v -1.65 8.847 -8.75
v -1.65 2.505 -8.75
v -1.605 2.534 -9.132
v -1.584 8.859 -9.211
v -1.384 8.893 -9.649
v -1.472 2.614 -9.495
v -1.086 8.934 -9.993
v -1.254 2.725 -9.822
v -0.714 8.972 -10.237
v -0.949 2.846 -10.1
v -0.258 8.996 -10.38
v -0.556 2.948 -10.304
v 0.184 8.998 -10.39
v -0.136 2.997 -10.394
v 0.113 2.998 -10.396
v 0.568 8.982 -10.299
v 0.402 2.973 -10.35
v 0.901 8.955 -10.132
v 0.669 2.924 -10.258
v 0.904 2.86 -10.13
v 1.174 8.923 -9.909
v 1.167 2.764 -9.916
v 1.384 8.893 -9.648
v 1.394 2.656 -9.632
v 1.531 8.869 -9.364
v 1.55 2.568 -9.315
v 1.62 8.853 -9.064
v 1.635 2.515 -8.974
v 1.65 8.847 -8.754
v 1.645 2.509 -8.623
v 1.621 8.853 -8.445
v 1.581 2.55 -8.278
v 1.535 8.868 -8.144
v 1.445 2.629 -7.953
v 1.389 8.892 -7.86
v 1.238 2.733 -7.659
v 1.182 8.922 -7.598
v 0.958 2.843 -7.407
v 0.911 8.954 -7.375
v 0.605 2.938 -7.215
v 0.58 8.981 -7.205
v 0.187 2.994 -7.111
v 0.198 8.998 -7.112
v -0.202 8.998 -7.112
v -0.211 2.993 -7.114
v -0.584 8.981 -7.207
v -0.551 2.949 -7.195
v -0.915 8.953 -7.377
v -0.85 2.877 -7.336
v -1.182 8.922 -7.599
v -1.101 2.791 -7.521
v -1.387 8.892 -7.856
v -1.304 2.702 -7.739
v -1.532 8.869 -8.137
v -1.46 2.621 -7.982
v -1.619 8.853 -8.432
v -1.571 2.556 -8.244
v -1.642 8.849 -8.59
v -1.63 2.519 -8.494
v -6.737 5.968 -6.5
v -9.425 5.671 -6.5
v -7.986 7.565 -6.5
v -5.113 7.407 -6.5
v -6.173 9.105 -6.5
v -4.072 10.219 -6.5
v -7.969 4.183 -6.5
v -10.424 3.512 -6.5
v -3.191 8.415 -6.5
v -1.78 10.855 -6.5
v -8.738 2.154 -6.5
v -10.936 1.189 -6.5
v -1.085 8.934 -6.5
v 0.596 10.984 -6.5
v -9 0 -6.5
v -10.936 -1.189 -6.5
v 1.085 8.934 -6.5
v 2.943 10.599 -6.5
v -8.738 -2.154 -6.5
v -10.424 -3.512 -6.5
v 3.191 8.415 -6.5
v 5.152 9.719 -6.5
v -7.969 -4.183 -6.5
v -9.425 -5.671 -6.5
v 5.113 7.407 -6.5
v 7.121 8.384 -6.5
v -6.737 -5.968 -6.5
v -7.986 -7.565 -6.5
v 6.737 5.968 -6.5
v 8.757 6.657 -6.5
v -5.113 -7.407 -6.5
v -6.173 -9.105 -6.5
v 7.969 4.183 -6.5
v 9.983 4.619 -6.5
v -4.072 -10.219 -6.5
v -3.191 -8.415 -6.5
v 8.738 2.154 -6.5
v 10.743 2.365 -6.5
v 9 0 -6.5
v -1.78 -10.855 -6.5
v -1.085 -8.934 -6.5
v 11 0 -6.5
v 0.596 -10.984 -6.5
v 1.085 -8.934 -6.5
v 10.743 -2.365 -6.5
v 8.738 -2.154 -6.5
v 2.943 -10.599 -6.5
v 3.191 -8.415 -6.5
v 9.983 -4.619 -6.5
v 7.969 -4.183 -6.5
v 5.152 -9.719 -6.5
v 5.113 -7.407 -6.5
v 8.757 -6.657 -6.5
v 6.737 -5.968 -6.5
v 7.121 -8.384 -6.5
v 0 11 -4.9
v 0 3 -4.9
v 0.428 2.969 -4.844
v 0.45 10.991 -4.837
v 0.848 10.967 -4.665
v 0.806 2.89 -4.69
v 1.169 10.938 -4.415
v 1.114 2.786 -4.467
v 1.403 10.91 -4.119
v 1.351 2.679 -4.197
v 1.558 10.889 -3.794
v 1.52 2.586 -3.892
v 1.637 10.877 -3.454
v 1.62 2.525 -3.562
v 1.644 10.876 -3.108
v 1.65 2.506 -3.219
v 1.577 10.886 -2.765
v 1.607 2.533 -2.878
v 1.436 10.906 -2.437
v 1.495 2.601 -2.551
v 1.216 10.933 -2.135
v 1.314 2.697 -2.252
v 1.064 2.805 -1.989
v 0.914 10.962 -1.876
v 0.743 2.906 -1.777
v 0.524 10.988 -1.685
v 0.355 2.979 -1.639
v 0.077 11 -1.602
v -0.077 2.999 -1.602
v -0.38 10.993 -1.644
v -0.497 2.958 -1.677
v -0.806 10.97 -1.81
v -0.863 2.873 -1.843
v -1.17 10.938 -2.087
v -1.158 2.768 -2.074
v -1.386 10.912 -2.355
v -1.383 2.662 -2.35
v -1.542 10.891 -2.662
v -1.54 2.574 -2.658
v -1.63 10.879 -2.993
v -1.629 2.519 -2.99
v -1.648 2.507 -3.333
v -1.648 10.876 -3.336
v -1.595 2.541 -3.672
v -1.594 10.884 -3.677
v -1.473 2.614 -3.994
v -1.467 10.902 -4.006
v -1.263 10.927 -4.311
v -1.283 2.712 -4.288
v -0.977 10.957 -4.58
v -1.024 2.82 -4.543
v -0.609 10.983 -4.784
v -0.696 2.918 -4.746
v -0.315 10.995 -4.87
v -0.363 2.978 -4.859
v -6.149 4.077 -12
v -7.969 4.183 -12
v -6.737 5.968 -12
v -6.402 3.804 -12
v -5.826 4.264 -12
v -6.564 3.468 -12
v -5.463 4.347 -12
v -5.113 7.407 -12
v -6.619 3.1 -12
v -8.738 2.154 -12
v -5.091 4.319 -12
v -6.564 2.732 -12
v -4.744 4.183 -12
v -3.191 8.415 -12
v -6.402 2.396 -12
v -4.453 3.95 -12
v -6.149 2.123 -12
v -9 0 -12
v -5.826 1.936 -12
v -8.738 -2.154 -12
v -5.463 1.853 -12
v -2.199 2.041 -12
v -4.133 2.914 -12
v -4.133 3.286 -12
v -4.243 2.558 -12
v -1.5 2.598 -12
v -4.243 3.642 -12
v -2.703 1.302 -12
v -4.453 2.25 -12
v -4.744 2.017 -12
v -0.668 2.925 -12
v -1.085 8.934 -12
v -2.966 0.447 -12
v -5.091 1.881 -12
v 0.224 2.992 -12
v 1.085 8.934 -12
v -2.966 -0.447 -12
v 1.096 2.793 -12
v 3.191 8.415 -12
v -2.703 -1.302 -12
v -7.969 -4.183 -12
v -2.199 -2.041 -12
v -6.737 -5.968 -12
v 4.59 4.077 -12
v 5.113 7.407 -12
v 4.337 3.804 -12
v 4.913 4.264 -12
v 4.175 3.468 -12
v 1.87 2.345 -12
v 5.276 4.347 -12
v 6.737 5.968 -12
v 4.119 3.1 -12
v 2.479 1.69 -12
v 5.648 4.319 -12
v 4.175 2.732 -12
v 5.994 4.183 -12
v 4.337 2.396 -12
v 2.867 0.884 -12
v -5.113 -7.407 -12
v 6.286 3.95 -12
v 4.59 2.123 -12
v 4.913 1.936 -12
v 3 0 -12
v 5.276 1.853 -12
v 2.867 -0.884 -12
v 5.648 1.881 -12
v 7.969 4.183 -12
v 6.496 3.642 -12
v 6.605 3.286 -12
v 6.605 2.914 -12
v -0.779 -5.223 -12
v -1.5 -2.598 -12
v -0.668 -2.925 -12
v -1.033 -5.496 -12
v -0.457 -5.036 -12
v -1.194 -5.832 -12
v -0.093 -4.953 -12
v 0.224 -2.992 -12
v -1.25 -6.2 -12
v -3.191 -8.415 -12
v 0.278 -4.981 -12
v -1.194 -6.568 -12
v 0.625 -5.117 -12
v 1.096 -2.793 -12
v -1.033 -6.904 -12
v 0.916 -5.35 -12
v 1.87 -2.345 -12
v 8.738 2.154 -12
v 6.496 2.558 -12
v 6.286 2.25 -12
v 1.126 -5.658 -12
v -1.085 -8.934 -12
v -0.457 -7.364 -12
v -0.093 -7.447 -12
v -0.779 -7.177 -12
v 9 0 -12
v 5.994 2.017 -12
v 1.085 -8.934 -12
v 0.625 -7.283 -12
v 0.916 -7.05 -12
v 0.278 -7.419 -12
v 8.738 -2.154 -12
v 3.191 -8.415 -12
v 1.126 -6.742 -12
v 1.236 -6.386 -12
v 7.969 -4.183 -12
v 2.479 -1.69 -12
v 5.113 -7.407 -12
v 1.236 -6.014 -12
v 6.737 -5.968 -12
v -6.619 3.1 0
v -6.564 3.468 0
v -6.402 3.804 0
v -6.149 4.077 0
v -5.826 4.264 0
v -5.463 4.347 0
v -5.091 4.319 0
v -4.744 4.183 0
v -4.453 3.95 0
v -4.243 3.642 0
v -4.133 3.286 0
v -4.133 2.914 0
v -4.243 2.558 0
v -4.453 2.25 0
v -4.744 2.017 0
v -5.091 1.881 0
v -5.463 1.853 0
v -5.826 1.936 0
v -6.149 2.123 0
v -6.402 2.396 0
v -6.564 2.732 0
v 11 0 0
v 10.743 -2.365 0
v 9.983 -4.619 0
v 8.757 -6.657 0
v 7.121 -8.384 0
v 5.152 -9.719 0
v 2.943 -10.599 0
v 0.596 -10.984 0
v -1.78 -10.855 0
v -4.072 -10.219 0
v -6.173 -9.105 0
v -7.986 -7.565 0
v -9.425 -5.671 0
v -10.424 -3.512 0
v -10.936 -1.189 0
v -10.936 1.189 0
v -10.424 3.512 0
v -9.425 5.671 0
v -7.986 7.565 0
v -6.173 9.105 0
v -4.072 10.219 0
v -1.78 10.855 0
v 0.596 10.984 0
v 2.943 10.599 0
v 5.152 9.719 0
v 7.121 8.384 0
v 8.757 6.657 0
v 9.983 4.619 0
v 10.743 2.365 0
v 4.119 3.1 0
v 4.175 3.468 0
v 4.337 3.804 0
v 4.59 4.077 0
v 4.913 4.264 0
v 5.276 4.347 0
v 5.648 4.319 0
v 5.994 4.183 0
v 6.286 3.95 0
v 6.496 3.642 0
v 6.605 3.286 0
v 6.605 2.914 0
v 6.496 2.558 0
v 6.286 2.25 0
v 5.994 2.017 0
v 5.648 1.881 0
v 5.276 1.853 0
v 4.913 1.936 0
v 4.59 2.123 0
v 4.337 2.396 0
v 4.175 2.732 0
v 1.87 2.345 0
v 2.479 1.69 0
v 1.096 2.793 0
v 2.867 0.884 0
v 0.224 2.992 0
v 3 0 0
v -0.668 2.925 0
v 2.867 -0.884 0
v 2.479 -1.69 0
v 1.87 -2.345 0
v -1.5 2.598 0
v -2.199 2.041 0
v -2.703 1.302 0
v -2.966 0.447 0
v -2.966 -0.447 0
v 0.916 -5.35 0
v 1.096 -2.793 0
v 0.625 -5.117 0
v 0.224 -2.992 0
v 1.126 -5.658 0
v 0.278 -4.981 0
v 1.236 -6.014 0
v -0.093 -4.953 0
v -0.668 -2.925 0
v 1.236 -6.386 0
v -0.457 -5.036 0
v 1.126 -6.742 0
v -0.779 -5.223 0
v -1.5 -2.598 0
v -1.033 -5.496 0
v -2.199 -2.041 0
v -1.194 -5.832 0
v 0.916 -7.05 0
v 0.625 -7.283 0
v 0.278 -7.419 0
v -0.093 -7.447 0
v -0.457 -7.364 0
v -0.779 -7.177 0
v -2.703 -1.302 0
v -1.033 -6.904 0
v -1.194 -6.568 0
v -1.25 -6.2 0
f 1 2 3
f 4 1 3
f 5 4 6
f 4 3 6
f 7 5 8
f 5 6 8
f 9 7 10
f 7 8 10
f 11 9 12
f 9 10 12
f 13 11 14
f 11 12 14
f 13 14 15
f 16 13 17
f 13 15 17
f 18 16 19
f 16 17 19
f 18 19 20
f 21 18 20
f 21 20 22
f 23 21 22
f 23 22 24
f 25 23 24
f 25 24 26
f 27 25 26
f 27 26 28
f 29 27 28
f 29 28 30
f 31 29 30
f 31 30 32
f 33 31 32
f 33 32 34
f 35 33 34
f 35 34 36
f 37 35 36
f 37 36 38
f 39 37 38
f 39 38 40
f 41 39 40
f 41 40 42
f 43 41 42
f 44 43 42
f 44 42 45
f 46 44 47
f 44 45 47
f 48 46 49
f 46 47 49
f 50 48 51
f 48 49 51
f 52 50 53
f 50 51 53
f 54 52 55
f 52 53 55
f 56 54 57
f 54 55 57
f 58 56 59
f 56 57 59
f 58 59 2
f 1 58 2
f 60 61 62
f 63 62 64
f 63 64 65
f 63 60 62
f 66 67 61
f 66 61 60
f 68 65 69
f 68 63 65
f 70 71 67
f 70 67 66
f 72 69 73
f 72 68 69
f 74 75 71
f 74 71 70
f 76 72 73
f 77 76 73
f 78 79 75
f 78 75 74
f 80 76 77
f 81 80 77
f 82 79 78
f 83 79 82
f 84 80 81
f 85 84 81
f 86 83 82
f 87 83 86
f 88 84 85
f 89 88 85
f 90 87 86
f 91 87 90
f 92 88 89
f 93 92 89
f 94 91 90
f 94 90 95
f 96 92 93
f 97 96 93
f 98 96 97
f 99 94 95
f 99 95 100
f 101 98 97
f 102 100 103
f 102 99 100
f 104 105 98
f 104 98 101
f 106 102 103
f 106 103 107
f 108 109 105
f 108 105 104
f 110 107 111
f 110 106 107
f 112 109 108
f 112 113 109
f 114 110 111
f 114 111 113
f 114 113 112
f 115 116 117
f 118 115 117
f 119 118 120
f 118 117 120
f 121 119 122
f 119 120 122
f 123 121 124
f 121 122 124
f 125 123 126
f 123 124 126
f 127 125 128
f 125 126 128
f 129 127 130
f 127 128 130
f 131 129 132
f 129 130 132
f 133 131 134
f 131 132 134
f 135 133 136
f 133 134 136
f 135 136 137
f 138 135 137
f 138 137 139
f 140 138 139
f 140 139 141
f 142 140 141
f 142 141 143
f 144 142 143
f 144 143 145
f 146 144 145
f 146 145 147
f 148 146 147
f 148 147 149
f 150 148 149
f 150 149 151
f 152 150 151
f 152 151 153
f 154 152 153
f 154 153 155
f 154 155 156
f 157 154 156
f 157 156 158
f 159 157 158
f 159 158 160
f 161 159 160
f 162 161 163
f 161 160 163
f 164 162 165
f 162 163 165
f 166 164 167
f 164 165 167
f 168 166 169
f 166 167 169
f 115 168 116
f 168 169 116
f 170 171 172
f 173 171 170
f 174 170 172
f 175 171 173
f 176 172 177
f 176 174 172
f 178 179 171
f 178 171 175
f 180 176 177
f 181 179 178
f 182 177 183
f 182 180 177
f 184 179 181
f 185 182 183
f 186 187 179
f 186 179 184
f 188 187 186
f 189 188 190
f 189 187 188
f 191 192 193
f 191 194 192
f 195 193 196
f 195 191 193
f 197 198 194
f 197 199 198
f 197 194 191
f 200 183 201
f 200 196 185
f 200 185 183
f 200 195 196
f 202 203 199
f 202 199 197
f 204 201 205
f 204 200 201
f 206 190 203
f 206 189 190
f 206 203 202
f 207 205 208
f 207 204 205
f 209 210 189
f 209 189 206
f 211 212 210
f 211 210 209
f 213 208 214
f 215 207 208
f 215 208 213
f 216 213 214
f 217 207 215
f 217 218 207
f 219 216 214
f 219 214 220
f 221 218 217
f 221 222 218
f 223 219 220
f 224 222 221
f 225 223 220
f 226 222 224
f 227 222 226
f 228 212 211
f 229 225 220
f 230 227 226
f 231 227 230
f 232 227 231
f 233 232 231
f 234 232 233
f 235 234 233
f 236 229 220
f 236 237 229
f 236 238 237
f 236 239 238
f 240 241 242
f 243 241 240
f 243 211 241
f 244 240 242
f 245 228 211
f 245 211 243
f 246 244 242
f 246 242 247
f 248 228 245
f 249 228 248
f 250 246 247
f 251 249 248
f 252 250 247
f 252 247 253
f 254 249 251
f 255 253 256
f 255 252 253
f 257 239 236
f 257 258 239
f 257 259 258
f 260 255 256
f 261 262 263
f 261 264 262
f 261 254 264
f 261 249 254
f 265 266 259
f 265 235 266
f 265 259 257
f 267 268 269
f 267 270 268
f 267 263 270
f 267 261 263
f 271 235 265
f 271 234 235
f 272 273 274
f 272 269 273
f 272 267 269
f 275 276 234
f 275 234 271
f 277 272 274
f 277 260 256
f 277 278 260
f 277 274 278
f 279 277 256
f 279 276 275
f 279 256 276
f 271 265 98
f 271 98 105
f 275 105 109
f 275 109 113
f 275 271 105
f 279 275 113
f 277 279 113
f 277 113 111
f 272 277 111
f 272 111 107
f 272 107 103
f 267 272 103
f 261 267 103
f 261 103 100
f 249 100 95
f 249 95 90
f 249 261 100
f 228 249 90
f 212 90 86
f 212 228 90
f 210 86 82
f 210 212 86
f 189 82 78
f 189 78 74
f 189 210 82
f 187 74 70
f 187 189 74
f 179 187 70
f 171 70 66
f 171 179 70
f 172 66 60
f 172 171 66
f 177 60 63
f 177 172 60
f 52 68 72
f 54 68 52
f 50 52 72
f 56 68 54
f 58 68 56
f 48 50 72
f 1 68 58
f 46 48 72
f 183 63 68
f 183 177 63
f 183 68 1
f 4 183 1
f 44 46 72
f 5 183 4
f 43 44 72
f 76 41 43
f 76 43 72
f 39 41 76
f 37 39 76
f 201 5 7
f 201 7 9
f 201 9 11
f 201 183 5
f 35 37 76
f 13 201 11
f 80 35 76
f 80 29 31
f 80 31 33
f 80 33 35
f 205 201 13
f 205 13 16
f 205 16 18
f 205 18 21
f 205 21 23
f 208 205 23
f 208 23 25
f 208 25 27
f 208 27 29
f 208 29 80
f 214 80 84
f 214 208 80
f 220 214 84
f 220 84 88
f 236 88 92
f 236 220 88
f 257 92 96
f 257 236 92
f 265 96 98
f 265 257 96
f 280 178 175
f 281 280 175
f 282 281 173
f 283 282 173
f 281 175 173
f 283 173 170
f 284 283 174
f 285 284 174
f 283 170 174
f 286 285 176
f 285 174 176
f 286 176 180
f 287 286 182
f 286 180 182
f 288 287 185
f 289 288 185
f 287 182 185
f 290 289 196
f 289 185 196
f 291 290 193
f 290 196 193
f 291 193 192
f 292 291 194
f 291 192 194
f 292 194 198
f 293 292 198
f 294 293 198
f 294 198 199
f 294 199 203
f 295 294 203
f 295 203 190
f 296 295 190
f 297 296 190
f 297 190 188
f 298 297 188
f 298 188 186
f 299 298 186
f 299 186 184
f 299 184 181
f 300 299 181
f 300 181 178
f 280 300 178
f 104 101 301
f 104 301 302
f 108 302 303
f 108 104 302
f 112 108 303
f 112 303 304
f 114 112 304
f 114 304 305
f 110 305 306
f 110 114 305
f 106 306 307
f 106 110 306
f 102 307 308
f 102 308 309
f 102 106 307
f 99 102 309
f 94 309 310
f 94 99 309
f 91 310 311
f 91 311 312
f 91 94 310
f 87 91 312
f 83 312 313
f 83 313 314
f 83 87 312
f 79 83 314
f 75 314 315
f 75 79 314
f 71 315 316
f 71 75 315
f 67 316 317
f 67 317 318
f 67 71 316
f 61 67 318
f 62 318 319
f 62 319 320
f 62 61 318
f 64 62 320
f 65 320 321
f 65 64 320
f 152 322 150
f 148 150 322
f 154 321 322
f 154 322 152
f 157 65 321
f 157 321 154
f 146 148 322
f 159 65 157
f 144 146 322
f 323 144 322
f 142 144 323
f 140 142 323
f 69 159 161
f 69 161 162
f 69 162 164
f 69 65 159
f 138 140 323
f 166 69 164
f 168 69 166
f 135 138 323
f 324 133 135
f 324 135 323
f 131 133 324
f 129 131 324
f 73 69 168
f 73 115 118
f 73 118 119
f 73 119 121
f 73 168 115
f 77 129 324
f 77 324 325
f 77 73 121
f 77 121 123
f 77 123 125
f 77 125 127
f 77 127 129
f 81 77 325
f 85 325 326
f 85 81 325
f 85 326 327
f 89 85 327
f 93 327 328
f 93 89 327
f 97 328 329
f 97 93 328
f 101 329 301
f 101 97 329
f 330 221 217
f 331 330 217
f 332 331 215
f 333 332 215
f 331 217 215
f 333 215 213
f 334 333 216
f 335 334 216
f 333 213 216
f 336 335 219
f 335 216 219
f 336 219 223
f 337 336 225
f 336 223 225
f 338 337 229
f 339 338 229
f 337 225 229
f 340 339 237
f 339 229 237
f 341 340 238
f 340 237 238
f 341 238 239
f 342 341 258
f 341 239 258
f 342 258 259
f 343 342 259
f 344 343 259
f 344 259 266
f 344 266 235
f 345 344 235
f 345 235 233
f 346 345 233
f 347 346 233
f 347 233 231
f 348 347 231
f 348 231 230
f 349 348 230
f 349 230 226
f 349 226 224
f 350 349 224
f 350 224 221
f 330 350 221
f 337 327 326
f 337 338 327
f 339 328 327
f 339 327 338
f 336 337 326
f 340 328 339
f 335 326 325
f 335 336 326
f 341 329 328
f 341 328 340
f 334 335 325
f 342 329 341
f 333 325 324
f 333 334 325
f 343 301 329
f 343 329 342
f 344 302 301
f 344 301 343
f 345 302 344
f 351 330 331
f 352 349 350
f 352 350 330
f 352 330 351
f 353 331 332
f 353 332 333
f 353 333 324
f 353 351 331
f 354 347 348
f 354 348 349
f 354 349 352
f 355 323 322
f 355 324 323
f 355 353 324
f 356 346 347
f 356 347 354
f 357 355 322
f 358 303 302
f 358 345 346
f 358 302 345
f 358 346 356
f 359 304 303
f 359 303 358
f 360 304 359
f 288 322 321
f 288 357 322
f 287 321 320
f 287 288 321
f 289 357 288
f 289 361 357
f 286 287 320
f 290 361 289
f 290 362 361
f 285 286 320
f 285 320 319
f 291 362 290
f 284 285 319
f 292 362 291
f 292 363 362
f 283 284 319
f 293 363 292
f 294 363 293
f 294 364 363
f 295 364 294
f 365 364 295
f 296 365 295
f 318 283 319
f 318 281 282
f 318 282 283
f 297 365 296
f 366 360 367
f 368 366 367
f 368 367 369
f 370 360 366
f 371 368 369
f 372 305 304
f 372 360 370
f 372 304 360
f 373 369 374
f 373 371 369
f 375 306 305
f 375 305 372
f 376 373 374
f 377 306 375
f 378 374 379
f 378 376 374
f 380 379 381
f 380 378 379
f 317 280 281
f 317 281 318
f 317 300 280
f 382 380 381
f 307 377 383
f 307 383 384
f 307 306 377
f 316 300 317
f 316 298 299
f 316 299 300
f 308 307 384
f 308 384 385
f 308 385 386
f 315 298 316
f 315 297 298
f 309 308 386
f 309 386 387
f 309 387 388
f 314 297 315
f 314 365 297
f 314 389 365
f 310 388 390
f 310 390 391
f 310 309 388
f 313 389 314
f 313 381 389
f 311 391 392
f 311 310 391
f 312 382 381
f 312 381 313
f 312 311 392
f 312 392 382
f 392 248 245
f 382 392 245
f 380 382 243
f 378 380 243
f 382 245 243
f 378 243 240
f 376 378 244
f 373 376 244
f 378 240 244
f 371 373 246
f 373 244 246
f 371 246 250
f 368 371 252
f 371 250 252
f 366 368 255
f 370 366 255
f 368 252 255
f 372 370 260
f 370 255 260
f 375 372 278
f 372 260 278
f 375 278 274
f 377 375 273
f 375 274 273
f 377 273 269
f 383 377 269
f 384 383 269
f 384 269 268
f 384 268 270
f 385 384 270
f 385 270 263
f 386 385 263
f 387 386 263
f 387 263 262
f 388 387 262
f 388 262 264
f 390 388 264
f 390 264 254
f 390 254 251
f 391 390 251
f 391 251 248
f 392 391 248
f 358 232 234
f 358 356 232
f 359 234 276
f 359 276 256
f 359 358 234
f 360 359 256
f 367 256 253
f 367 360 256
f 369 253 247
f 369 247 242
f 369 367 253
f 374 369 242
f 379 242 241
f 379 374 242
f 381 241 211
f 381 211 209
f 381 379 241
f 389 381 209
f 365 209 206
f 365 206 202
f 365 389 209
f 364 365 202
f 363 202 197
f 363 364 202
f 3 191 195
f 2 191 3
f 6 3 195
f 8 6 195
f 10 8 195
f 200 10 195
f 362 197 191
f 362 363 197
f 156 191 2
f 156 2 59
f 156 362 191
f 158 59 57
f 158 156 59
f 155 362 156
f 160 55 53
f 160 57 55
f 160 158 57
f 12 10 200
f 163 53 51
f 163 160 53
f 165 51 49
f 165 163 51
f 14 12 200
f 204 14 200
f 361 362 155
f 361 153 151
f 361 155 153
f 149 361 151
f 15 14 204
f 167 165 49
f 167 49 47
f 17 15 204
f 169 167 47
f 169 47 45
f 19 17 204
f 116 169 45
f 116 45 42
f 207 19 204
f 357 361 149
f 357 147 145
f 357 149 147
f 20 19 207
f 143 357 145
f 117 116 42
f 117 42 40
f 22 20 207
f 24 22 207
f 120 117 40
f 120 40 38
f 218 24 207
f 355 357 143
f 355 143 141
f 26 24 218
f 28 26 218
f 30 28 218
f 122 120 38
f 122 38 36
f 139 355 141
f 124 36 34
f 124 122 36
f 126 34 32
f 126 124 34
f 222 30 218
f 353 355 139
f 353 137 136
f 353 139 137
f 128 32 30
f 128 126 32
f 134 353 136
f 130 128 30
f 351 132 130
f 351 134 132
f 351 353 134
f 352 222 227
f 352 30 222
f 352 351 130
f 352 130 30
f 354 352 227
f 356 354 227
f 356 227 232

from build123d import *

# Parameters (mm, degrees)
M3X0_5_TAPPED_HOLE1_D               = 2.5
M4X0_7_TAPPED_HOLE1_D               = 3.3
M4X0_7_TAPPED_HOLE1_DEPTH           = 10.999
M4X0_7_TAPPED_HOLE1_TIP             = 0.991420021
M4X0_7_TAPPED_HOLE1_ON_FACE_2_D     = 3.3
M4X0_7_TAPPED_HOLE1_ON_FACE_2_DEPTH = 10.999
M4X0_7_TAPPED_HOLE1_ON_FACE_2_TIP   = 0.991420021


with BuildPart() as part:
    # Sketch2 → Revolve1 (revolve)
    with BuildSketch(Plane(origin=(0, 0, 0), x_dir=(0, 0, -1), z_dir=(1, 0, 0)), mode=Mode.PRIVATE) as revolve1_sk:
        Polygon((0, 3), (0, 11), (6.5, 11), (6.5, 9), (12, 9), (12, 3), align=None)
    revolve(revolve1_sk.sketch.rotate(Axis((0, 0, 0), (0, 0, -1)), 90), axis=Axis((0, 0, 0), (0, 0, -1)))

    # M3x0.5 Tapped Hole1 (through all)
    with Locations(Plane.XY):
        with Locations((35.910466859, 13.470944302), (5.369357503, 3.1), (-5.369357503, 3.1), (0, -6.2)):
            Hole(M3X0_5_TAPPED_HOLE1_D / 2)

    # M4x0.7 Tapped Hole1
    with Locations(Plane(origin=(0, 9, -8.75), x_dir=(1, 0, 0), z_dir=(0, 1, 0))):
        with Locations((0, 0)):
            Hole(M4X0_7_TAPPED_HOLE1_D / 2, depth=M4X0_7_TAPPED_HOLE1_DEPTH)
            with Locations((0, 0, -(M4X0_7_TAPPED_HOLE1_DEPTH + M4X0_7_TAPPED_HOLE1_TIP / 2))):  # 118° drill point
                Cone(0, M4X0_7_TAPPED_HOLE1_D / 2, M4X0_7_TAPPED_HOLE1_TIP, mode=Mode.SUBTRACT)

    # M4x0.7 Tapped Hole1 on face 2
    with Locations(Plane(origin=(0, 11, -3.25), x_dir=(0, 0, 1), z_dir=(0, 1, 0))):
        with Locations((0, 0)):
            Hole(M4X0_7_TAPPED_HOLE1_ON_FACE_2_D / 2, depth=M4X0_7_TAPPED_HOLE1_ON_FACE_2_DEPTH)
            with Locations((0, 0, -(M4X0_7_TAPPED_HOLE1_ON_FACE_2_DEPTH + M4X0_7_TAPPED_HOLE1_ON_FACE_2_TIP / 2))):  # 118° drill point
                Cone(0, M4X0_7_TAPPED_HOLE1_ON_FACE_2_D / 2, M4X0_7_TAPPED_HOLE1_ON_FACE_2_TIP, mode=Mode.SUBTRACT)


solid = part.part
